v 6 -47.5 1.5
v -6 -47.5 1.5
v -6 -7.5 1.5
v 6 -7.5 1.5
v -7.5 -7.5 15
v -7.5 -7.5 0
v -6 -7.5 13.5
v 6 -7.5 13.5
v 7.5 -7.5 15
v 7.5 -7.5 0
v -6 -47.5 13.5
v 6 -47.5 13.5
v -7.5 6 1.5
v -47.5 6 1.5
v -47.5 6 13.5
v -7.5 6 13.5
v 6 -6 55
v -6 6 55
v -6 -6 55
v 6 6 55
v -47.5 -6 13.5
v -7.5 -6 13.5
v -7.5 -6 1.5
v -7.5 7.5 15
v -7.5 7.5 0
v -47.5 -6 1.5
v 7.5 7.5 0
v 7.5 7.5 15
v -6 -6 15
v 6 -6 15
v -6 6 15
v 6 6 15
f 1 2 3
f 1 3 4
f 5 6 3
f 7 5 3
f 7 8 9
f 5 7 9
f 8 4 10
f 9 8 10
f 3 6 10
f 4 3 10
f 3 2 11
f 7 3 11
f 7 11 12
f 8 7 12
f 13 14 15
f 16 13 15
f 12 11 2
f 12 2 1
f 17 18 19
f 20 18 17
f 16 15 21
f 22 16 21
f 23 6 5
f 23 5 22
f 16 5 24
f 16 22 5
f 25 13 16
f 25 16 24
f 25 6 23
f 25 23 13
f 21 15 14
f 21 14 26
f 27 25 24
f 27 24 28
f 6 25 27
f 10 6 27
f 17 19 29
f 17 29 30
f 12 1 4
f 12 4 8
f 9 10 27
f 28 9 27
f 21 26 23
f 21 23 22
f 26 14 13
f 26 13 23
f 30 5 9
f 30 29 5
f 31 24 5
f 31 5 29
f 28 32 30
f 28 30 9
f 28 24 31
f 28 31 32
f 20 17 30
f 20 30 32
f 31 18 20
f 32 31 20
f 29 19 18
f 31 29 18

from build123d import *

# Parameters (mm, degrees)
SKETCH_W     = 15
SKETCH_H     = 15
PAD_DEPTH    = 15
SKETCH001_W  = 12
SKETCH001_H  = 12
PAD001_DEPTH = 40
SKETCH002_W  = 12
SKETCH002_H  = 12
PAD002_DEPTH = 40
SKETCH003_W  = 12
SKETCH003_H  = 12
PAD003_DEPTH = 40


with BuildPart() as part:
    # Sketch → Pad (new body)
    with BuildSketch(Plane.XY):
        Rectangle(SKETCH_W, SKETCH_H)
    extrude(amount=PAD_DEPTH)

    # Sketch001 → Pad001 (new body)
    with BuildSketch(Plane.XY.offset(15)):
        Rectangle(SKETCH001_W, SKETCH001_H)
    extrude(amount=PAD001_DEPTH)

    # Sketch002 → Pad002 (new body)
    with BuildSketch(Plane(origin=(-7.5, 0, 0), x_dir=(0, -1, 0), z_dir=(-1, 0, 0))):
        with Locations((0, 7.5)):
            Rectangle(SKETCH002_W, SKETCH002_H)
    extrude(amount=PAD002_DEPTH)

    # Sketch003 → Pad003 (new body)
    with BuildSketch(Plane.XZ.offset(7.5)):
        with Locations((0, 7.5)):
            Rectangle(SKETCH003_W, SKETCH003_H)
    extrude(amount=PAD003_DEPTH)


solid = part.part
